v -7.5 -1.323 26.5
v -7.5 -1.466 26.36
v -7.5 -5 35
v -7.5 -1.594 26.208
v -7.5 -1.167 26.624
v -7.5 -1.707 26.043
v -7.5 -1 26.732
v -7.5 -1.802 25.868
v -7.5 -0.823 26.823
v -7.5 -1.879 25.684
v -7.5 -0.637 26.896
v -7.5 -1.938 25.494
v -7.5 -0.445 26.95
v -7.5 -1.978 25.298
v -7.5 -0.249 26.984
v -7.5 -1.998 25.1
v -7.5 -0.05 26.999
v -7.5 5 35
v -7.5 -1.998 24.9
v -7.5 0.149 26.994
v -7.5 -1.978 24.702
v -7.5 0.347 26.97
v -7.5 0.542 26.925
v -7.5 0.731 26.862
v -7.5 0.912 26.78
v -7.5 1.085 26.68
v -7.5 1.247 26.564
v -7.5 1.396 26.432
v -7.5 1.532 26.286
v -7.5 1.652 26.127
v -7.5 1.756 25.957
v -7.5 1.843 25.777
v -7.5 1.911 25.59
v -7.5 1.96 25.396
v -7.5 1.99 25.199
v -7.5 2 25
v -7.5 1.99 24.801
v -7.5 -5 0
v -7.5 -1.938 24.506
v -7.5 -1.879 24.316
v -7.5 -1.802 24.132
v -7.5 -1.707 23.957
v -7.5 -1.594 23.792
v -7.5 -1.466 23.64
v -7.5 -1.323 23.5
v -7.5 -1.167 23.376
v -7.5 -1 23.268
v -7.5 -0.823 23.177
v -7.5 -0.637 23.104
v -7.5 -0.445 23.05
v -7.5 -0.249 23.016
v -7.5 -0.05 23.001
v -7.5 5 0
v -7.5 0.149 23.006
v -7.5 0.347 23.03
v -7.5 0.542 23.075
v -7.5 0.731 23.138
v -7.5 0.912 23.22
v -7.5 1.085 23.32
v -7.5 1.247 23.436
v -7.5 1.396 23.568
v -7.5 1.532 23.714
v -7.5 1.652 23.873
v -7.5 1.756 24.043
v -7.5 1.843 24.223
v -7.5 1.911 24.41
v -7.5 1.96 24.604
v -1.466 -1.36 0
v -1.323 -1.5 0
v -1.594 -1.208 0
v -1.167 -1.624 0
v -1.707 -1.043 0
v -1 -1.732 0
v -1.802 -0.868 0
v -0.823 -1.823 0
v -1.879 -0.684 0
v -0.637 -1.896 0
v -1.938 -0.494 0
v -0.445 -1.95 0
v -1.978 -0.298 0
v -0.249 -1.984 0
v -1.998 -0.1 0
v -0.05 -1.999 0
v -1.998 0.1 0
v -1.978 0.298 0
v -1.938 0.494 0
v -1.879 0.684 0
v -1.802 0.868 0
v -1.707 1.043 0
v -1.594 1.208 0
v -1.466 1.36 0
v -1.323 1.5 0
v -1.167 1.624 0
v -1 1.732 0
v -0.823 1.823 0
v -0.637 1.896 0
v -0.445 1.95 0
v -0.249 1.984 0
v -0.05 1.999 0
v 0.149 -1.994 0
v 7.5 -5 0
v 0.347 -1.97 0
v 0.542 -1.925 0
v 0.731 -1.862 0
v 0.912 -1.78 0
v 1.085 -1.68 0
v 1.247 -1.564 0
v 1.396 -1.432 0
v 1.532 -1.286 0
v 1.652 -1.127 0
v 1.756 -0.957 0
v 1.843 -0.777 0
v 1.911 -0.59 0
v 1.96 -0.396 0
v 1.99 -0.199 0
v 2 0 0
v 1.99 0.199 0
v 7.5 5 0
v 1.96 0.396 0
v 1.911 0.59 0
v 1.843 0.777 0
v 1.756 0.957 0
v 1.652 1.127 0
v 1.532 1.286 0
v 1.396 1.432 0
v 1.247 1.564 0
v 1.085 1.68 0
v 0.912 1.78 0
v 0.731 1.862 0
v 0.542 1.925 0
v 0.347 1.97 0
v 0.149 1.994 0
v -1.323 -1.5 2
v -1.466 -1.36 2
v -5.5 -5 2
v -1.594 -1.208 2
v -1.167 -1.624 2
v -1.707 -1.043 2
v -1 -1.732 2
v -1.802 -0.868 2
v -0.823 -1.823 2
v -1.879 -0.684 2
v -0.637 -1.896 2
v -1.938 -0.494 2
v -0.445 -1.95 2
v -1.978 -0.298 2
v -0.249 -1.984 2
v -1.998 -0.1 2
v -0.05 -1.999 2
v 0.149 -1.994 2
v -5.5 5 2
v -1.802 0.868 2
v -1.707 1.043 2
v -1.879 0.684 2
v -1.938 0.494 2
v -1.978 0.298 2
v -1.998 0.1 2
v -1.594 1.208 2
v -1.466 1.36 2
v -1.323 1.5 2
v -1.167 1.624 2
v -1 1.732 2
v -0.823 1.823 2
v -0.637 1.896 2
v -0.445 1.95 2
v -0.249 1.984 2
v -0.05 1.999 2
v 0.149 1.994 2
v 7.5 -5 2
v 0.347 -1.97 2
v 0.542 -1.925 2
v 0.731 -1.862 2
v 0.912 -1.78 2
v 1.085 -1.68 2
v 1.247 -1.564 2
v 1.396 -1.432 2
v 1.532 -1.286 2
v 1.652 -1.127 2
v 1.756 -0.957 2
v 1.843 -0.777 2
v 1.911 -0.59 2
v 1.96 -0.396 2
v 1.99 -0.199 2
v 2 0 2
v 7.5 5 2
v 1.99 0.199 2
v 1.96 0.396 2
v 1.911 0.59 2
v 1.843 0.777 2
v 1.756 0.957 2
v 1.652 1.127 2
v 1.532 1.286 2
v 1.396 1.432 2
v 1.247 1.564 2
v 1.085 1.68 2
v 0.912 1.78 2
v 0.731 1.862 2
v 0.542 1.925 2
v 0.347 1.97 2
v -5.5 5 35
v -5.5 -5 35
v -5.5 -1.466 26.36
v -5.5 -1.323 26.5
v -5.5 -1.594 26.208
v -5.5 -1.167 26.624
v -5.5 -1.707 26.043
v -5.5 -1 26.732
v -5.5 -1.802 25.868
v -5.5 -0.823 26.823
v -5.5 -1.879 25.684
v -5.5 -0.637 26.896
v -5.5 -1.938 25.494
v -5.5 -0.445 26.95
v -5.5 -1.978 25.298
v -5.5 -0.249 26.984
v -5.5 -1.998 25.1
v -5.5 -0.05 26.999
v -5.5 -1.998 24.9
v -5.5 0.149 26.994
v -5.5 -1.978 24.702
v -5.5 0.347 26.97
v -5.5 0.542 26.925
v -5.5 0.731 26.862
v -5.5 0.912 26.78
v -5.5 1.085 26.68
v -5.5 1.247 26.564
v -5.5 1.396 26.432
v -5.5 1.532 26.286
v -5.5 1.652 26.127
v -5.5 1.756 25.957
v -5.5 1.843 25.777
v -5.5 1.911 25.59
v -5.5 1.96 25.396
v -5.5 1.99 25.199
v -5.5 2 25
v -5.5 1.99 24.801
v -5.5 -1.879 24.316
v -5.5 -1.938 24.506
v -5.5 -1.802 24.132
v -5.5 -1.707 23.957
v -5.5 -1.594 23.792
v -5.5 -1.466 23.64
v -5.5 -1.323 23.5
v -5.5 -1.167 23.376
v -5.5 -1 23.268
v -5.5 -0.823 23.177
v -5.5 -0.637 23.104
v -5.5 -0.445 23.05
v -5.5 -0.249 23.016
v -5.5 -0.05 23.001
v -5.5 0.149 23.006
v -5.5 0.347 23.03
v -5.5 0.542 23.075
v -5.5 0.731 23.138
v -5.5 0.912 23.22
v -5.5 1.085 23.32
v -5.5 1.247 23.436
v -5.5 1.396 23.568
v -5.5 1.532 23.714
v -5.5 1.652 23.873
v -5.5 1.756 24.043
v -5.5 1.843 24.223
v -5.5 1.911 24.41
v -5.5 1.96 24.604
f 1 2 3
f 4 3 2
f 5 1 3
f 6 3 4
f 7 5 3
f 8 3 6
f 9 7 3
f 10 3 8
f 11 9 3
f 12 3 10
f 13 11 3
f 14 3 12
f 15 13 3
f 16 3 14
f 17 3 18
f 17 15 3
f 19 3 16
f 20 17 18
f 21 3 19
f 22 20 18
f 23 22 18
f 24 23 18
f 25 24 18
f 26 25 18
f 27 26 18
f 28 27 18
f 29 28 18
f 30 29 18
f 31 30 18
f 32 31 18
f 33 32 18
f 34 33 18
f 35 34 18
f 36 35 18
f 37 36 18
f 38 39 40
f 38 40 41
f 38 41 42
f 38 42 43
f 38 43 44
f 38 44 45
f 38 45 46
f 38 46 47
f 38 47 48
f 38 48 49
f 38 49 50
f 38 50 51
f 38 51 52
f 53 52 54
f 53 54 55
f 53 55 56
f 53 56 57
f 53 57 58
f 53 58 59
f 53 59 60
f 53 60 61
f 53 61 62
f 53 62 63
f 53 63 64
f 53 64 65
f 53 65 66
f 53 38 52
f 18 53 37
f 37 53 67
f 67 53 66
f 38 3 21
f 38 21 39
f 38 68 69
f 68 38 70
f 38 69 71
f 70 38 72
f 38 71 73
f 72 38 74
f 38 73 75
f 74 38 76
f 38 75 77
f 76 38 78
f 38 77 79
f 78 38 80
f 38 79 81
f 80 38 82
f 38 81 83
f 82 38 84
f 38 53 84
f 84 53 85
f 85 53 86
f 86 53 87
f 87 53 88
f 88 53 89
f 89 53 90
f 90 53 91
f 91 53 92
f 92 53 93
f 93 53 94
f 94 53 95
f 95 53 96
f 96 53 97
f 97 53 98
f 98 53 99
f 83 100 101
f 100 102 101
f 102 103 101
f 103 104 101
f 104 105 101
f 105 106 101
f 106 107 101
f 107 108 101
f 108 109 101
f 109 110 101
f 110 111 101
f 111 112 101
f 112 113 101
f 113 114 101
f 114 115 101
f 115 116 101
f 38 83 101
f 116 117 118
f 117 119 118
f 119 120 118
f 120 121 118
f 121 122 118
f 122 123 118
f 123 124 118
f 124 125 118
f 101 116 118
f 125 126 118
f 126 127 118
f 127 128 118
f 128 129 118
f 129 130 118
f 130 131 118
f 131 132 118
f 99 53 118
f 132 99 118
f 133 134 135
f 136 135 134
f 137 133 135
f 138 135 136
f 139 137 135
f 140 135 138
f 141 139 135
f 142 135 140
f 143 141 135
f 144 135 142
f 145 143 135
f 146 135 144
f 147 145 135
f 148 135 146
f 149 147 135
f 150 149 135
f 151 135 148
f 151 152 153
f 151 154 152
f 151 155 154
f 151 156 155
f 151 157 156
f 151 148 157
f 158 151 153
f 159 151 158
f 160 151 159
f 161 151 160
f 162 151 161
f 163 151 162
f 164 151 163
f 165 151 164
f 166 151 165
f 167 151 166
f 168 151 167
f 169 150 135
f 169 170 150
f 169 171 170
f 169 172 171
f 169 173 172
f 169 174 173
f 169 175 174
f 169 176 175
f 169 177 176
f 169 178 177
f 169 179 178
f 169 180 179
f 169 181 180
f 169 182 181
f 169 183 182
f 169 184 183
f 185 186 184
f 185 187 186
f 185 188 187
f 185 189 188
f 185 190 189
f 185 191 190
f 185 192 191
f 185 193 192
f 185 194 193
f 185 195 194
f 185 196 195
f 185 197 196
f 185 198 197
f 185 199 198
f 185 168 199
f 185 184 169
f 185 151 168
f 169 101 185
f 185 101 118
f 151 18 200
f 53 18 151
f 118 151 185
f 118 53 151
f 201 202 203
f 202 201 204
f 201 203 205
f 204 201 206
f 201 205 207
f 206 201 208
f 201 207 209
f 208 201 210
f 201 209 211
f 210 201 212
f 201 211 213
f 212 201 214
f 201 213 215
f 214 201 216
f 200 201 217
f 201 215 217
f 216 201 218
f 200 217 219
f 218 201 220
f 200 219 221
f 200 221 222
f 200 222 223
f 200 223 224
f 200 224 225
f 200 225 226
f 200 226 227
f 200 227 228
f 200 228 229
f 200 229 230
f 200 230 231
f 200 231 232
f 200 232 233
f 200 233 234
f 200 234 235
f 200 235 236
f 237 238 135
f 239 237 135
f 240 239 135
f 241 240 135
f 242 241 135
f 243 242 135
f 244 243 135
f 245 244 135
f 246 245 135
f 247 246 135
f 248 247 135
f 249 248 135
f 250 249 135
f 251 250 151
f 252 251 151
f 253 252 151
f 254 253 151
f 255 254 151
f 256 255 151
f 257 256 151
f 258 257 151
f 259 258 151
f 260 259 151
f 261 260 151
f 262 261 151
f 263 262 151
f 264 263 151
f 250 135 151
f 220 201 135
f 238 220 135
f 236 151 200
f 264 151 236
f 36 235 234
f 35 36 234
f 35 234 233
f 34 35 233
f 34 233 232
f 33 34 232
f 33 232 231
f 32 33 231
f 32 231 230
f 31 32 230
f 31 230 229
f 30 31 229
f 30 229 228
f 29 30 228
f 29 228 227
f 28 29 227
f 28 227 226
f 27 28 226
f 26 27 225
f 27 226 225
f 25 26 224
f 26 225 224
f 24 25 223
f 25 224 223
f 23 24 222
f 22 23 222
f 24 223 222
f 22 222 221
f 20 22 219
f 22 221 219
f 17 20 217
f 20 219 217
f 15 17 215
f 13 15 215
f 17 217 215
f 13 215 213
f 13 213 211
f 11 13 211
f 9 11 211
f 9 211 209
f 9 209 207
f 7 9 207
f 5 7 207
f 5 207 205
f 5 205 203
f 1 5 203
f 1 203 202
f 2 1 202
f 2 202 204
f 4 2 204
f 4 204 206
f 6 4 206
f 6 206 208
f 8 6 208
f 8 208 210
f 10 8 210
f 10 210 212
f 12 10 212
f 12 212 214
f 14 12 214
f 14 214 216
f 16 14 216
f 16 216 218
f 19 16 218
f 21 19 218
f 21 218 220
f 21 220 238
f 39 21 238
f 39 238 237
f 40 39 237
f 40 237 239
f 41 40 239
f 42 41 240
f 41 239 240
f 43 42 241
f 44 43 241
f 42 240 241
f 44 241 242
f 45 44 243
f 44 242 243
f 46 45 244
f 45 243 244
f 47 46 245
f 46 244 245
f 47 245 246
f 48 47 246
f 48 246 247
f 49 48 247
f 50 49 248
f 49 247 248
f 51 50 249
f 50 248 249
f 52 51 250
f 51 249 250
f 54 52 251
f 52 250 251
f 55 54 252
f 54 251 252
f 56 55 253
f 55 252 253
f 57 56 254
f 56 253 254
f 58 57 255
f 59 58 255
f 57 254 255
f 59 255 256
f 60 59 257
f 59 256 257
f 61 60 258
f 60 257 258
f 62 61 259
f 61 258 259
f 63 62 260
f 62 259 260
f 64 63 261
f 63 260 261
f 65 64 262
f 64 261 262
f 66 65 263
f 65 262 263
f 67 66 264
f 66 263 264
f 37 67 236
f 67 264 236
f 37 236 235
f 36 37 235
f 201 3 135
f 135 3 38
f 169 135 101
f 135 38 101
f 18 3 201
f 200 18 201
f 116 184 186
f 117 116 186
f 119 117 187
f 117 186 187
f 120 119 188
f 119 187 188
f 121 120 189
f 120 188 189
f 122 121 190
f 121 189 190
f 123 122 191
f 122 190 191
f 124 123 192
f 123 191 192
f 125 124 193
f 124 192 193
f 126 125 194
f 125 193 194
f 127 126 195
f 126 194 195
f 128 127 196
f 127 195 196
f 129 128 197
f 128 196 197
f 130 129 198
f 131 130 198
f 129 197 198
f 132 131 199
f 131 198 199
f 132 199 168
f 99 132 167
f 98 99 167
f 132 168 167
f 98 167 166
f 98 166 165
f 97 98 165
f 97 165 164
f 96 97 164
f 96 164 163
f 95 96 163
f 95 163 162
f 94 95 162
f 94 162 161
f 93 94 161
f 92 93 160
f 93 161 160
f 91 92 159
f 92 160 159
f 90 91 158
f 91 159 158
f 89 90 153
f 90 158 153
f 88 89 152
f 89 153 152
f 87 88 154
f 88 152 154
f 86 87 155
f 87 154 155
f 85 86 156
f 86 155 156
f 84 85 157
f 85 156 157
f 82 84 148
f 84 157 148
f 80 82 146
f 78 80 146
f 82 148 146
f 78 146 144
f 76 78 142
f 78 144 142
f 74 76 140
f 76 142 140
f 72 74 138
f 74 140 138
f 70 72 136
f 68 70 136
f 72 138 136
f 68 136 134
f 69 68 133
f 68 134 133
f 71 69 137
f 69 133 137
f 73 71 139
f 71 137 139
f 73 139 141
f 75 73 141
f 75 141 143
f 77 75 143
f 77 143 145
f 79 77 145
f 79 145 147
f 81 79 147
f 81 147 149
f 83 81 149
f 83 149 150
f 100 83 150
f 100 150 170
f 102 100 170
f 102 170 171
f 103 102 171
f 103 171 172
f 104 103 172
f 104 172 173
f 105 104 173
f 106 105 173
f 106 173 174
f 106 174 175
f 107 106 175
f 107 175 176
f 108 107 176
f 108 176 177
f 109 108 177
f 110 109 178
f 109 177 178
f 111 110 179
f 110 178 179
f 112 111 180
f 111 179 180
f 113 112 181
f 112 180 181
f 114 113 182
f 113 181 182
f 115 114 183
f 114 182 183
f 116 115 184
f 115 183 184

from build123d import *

# Parameters (mm, degrees)
SKETCH1_W           = 15
SKETCH1_H           = 10
BOSS_EXTRUDE2_DEPTH = 2
SKETCH2_R           = 2
CUT_EXTRUDE2_DEPTH  = 2
SKETCH3_W           = 2
SKETCH3_H           = 10
BOSS_EXTRUDE3_DEPTH = 33
SKETCH4_R           = 2
CUT_EXTRUDE3_DEPTH  = 33


with BuildPart() as part:
    # Sketch1 → Boss-Extrude2 (new body)
    with BuildSketch(Plane.XY):
        Rectangle(SKETCH1_W, SKETCH1_H)
    extrude(amount=BOSS_EXTRUDE2_DEPTH)

    # Sketch2 → Cut-Extrude2 (cut)
    with BuildSketch(Plane.XY.offset(2)):
        Circle(SKETCH2_R)
    extrude(amount=-CUT_EXTRUDE2_DEPTH, mode=Mode.SUBTRACT)

    # Sketch3 → Boss-Extrude3 (add)
    with BuildSketch(Plane.XY.offset(2)):
        with Locations((-6.5, 0)):
            Rectangle(SKETCH3_W, SKETCH3_H)
    extrude(amount=BOSS_EXTRUDE3_DEPTH)

    # Sketch4 → Cut-Extrude3 (cut)
    with BuildSketch(Plane(origin=(-5.5, 0, 0), x_dir=(0, 0, -1), z_dir=(1, 0, 0))):
        with Locations(Location((-25, 0, 0), (0, 0, 90))):
            Circle(SKETCH4_R)
    extrude(amount=-CUT_EXTRUDE3_DEPTH, mode=Mode.SUBTRACT)


solid = part.part
